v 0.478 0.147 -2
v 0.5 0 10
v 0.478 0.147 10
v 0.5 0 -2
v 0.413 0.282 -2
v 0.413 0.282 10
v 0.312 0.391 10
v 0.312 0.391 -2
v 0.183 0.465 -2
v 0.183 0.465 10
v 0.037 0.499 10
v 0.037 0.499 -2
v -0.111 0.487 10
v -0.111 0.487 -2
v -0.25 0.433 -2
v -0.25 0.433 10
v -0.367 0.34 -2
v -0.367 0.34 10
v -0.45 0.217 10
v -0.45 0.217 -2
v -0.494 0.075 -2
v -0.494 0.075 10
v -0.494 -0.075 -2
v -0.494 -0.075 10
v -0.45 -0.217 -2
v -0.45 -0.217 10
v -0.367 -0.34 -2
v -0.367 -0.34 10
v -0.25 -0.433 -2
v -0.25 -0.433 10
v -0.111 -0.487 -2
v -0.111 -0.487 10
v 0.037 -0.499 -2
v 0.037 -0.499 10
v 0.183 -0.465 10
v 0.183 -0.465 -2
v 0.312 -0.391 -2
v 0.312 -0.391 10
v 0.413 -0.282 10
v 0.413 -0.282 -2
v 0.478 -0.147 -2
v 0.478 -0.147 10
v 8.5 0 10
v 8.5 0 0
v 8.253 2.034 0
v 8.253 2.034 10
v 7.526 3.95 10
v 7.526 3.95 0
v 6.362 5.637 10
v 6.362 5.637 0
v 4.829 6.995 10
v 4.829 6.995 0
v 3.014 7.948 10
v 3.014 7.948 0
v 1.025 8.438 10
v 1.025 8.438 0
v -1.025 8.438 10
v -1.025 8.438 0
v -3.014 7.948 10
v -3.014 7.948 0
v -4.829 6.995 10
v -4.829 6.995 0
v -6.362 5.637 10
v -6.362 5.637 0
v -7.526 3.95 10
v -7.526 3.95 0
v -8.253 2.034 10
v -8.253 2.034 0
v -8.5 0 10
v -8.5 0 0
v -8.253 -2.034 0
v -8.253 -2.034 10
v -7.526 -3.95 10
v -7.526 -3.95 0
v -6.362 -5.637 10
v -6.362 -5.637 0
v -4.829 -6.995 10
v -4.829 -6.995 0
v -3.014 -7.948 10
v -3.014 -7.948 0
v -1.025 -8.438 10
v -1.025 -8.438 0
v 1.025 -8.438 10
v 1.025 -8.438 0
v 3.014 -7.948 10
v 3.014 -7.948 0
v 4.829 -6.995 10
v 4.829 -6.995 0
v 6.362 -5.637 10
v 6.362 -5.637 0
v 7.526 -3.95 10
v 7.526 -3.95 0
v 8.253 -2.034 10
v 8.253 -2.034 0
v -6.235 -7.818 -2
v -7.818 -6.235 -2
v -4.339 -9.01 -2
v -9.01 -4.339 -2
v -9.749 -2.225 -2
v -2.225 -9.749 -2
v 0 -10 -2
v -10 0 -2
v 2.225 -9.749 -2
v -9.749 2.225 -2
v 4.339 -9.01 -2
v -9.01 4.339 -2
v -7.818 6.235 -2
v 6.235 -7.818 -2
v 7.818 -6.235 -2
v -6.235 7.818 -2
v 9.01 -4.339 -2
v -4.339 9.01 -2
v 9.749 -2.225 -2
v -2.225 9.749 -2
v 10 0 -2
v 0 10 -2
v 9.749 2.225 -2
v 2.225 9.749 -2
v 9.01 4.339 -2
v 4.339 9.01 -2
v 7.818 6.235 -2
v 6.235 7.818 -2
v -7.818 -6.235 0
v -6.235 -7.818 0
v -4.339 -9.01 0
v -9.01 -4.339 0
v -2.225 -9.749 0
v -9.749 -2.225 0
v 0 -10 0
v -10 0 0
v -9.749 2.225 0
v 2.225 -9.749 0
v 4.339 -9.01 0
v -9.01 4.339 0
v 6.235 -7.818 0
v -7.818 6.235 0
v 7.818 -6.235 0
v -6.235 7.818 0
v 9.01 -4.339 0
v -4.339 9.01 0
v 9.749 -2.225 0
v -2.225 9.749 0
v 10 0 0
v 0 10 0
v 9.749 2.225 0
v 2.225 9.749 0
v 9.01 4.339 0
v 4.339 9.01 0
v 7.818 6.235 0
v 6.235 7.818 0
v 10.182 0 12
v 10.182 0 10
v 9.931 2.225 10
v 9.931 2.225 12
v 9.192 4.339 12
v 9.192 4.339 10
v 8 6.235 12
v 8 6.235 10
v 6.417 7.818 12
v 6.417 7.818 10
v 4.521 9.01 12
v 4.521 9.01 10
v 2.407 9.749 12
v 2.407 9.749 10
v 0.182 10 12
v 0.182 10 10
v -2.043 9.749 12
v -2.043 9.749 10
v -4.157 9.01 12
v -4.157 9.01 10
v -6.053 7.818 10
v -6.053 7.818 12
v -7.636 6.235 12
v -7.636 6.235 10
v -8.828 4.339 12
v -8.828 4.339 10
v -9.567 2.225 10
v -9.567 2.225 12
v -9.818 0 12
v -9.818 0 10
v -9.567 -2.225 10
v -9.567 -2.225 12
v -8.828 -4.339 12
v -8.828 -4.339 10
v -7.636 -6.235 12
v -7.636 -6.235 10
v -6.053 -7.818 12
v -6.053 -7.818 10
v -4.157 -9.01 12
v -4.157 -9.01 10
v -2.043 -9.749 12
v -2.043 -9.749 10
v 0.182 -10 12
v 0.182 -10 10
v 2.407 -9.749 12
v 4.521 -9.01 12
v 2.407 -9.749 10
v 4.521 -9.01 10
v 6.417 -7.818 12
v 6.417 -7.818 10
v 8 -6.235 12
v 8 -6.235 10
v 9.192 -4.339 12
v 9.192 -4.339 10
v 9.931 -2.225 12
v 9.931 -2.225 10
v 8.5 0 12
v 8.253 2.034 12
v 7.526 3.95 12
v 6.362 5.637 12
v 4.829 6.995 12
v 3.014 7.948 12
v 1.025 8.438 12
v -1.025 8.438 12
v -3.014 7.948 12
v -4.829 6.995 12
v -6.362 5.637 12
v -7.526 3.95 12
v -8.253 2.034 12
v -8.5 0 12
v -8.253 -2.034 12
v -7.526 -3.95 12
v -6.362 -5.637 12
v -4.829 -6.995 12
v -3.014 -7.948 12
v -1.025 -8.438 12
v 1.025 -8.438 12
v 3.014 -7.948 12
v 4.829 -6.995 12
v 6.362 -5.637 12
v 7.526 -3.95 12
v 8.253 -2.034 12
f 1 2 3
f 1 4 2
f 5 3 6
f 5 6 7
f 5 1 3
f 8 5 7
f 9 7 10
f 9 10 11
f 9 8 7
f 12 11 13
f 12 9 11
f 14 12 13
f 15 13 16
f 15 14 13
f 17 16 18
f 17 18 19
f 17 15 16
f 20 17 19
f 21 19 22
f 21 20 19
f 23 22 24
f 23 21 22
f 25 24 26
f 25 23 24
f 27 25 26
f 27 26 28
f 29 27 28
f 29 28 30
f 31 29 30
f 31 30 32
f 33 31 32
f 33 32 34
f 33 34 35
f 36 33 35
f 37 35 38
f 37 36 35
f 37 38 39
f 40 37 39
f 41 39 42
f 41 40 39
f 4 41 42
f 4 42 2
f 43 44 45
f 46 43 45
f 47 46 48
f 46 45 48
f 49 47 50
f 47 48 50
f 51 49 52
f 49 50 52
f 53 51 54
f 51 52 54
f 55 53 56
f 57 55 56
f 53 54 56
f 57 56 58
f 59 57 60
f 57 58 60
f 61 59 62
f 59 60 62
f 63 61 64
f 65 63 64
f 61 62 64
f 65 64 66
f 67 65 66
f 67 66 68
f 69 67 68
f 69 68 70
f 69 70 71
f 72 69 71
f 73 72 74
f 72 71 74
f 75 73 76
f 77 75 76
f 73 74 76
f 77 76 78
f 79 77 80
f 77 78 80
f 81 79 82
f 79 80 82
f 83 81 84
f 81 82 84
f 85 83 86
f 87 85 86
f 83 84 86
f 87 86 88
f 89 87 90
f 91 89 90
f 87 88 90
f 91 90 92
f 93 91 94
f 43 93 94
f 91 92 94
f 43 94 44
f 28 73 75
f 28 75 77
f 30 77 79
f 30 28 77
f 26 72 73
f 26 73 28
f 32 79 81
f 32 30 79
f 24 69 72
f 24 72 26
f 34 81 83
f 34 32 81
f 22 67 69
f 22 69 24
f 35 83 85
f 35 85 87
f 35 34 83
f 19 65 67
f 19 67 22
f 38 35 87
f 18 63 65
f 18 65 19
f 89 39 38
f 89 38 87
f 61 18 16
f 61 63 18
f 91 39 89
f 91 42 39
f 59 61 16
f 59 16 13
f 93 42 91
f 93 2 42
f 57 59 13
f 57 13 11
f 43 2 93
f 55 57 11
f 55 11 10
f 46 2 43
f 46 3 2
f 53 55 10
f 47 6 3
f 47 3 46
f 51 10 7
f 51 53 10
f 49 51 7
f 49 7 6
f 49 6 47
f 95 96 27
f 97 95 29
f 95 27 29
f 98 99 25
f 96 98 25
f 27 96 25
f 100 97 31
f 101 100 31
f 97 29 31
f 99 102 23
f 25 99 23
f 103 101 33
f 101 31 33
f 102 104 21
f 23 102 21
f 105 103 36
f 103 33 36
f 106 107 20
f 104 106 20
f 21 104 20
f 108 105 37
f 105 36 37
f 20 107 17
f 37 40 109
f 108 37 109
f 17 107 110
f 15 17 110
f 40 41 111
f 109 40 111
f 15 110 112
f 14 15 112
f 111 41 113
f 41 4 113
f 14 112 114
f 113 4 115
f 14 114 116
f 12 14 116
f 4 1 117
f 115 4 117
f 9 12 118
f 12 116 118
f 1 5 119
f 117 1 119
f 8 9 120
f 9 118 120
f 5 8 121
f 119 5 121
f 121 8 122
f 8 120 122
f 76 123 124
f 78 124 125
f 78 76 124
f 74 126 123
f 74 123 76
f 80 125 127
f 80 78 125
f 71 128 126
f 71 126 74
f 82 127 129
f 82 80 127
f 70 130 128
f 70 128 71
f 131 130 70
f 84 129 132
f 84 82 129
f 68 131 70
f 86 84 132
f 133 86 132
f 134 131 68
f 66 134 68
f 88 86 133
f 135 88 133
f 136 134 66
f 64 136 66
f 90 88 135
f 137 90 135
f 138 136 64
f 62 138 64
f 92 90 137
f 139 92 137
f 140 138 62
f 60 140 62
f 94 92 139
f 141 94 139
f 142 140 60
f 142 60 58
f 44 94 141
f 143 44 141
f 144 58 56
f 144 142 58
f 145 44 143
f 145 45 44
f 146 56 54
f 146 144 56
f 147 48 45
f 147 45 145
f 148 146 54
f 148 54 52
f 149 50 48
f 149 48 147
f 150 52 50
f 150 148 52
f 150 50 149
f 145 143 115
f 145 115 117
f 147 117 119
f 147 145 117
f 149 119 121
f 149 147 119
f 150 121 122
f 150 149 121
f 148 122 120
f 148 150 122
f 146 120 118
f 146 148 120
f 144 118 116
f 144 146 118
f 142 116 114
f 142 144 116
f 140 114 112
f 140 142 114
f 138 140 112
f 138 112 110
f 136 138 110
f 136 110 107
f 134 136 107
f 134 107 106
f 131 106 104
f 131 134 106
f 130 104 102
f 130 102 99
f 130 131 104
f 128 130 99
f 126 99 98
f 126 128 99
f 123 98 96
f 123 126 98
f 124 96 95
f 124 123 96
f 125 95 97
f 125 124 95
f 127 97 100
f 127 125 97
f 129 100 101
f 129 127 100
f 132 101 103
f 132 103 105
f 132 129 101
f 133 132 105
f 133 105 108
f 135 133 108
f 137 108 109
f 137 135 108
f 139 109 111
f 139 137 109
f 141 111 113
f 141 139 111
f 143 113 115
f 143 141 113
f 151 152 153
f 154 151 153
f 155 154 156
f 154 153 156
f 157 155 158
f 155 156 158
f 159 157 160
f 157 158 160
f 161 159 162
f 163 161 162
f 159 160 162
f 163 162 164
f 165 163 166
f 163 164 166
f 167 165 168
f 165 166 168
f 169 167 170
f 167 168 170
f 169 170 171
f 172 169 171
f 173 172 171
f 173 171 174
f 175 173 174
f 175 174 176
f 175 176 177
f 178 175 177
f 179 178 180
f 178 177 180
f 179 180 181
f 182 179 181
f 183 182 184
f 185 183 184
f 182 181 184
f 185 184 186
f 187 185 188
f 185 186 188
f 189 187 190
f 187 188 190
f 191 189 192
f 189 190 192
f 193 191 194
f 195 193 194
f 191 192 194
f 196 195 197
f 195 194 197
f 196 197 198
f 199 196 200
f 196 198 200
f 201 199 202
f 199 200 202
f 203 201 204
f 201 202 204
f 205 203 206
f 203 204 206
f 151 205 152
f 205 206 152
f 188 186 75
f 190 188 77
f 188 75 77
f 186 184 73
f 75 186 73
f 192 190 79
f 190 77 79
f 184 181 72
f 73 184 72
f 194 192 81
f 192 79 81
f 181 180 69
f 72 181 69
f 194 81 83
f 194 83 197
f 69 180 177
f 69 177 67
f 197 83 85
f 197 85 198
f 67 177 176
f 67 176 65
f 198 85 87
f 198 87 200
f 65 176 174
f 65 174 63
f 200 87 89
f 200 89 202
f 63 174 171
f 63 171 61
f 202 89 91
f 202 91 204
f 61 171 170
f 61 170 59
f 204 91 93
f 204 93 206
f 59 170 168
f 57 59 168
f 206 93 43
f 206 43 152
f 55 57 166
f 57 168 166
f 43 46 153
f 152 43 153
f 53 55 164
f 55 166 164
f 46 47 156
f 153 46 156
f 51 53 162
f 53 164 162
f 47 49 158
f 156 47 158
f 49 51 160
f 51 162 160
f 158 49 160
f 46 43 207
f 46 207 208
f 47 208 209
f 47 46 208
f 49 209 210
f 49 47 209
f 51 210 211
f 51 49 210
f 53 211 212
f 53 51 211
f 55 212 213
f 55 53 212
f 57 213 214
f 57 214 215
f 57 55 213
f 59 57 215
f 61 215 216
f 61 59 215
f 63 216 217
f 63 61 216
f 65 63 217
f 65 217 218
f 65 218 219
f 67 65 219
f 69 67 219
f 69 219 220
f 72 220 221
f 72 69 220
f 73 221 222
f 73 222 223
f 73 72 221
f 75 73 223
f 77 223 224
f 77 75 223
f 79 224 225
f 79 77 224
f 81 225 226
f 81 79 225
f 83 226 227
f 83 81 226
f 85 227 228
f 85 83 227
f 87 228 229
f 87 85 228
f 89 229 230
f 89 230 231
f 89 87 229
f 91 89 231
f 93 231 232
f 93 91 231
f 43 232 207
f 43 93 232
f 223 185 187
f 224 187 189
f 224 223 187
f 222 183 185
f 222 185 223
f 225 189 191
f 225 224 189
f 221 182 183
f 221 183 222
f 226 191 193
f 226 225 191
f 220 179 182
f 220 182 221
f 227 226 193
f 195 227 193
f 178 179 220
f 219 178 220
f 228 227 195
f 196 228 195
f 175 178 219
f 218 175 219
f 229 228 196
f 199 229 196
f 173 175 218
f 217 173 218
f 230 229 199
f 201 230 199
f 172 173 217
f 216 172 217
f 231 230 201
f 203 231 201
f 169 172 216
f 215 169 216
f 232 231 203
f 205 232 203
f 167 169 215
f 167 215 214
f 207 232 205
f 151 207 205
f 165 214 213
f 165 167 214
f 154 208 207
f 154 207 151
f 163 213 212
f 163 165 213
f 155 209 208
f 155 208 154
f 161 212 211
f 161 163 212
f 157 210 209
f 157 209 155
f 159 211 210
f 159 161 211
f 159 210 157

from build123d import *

# Parameters (mm, degrees)
F0_R     = 10
F0_R_2   = 0.5
F1_DEPTH = 2
F2_R     = 8.5
F2_R_2   = 0.5
F3_DEPTH = 10
F4_R     = 10
F4_R_2   = 8.5
F5_DEPTH = 2


with BuildPart() as f1:
    # F0 (on Top) → F1 (new body)
    with BuildSketch(Plane.XY):
        Circle(F0_R)
        Circle(F0_R_2, mode=Mode.SUBTRACT)
    extrude(amount=-F1_DEPTH)

    # F2 (on face) → F3 (join)
    with BuildSketch(Plane.XY):
        Circle(F2_R)
        Circle(F2_R_2, mode=Mode.SUBTRACT)
    extrude(amount=F3_DEPTH)


with BuildPart() as f5:
    # F4 (on face) → F5 (new body)
    with BuildSketch(Plane.XY.offset(10)):
        with Locations((0.182103, 0)):
            Circle(F4_R)
        Circle(F4_R_2, mode=Mode.SUBTRACT)
    extrude(amount=F5_DEPTH)


solid = Compound([f1.part, f5.part])
